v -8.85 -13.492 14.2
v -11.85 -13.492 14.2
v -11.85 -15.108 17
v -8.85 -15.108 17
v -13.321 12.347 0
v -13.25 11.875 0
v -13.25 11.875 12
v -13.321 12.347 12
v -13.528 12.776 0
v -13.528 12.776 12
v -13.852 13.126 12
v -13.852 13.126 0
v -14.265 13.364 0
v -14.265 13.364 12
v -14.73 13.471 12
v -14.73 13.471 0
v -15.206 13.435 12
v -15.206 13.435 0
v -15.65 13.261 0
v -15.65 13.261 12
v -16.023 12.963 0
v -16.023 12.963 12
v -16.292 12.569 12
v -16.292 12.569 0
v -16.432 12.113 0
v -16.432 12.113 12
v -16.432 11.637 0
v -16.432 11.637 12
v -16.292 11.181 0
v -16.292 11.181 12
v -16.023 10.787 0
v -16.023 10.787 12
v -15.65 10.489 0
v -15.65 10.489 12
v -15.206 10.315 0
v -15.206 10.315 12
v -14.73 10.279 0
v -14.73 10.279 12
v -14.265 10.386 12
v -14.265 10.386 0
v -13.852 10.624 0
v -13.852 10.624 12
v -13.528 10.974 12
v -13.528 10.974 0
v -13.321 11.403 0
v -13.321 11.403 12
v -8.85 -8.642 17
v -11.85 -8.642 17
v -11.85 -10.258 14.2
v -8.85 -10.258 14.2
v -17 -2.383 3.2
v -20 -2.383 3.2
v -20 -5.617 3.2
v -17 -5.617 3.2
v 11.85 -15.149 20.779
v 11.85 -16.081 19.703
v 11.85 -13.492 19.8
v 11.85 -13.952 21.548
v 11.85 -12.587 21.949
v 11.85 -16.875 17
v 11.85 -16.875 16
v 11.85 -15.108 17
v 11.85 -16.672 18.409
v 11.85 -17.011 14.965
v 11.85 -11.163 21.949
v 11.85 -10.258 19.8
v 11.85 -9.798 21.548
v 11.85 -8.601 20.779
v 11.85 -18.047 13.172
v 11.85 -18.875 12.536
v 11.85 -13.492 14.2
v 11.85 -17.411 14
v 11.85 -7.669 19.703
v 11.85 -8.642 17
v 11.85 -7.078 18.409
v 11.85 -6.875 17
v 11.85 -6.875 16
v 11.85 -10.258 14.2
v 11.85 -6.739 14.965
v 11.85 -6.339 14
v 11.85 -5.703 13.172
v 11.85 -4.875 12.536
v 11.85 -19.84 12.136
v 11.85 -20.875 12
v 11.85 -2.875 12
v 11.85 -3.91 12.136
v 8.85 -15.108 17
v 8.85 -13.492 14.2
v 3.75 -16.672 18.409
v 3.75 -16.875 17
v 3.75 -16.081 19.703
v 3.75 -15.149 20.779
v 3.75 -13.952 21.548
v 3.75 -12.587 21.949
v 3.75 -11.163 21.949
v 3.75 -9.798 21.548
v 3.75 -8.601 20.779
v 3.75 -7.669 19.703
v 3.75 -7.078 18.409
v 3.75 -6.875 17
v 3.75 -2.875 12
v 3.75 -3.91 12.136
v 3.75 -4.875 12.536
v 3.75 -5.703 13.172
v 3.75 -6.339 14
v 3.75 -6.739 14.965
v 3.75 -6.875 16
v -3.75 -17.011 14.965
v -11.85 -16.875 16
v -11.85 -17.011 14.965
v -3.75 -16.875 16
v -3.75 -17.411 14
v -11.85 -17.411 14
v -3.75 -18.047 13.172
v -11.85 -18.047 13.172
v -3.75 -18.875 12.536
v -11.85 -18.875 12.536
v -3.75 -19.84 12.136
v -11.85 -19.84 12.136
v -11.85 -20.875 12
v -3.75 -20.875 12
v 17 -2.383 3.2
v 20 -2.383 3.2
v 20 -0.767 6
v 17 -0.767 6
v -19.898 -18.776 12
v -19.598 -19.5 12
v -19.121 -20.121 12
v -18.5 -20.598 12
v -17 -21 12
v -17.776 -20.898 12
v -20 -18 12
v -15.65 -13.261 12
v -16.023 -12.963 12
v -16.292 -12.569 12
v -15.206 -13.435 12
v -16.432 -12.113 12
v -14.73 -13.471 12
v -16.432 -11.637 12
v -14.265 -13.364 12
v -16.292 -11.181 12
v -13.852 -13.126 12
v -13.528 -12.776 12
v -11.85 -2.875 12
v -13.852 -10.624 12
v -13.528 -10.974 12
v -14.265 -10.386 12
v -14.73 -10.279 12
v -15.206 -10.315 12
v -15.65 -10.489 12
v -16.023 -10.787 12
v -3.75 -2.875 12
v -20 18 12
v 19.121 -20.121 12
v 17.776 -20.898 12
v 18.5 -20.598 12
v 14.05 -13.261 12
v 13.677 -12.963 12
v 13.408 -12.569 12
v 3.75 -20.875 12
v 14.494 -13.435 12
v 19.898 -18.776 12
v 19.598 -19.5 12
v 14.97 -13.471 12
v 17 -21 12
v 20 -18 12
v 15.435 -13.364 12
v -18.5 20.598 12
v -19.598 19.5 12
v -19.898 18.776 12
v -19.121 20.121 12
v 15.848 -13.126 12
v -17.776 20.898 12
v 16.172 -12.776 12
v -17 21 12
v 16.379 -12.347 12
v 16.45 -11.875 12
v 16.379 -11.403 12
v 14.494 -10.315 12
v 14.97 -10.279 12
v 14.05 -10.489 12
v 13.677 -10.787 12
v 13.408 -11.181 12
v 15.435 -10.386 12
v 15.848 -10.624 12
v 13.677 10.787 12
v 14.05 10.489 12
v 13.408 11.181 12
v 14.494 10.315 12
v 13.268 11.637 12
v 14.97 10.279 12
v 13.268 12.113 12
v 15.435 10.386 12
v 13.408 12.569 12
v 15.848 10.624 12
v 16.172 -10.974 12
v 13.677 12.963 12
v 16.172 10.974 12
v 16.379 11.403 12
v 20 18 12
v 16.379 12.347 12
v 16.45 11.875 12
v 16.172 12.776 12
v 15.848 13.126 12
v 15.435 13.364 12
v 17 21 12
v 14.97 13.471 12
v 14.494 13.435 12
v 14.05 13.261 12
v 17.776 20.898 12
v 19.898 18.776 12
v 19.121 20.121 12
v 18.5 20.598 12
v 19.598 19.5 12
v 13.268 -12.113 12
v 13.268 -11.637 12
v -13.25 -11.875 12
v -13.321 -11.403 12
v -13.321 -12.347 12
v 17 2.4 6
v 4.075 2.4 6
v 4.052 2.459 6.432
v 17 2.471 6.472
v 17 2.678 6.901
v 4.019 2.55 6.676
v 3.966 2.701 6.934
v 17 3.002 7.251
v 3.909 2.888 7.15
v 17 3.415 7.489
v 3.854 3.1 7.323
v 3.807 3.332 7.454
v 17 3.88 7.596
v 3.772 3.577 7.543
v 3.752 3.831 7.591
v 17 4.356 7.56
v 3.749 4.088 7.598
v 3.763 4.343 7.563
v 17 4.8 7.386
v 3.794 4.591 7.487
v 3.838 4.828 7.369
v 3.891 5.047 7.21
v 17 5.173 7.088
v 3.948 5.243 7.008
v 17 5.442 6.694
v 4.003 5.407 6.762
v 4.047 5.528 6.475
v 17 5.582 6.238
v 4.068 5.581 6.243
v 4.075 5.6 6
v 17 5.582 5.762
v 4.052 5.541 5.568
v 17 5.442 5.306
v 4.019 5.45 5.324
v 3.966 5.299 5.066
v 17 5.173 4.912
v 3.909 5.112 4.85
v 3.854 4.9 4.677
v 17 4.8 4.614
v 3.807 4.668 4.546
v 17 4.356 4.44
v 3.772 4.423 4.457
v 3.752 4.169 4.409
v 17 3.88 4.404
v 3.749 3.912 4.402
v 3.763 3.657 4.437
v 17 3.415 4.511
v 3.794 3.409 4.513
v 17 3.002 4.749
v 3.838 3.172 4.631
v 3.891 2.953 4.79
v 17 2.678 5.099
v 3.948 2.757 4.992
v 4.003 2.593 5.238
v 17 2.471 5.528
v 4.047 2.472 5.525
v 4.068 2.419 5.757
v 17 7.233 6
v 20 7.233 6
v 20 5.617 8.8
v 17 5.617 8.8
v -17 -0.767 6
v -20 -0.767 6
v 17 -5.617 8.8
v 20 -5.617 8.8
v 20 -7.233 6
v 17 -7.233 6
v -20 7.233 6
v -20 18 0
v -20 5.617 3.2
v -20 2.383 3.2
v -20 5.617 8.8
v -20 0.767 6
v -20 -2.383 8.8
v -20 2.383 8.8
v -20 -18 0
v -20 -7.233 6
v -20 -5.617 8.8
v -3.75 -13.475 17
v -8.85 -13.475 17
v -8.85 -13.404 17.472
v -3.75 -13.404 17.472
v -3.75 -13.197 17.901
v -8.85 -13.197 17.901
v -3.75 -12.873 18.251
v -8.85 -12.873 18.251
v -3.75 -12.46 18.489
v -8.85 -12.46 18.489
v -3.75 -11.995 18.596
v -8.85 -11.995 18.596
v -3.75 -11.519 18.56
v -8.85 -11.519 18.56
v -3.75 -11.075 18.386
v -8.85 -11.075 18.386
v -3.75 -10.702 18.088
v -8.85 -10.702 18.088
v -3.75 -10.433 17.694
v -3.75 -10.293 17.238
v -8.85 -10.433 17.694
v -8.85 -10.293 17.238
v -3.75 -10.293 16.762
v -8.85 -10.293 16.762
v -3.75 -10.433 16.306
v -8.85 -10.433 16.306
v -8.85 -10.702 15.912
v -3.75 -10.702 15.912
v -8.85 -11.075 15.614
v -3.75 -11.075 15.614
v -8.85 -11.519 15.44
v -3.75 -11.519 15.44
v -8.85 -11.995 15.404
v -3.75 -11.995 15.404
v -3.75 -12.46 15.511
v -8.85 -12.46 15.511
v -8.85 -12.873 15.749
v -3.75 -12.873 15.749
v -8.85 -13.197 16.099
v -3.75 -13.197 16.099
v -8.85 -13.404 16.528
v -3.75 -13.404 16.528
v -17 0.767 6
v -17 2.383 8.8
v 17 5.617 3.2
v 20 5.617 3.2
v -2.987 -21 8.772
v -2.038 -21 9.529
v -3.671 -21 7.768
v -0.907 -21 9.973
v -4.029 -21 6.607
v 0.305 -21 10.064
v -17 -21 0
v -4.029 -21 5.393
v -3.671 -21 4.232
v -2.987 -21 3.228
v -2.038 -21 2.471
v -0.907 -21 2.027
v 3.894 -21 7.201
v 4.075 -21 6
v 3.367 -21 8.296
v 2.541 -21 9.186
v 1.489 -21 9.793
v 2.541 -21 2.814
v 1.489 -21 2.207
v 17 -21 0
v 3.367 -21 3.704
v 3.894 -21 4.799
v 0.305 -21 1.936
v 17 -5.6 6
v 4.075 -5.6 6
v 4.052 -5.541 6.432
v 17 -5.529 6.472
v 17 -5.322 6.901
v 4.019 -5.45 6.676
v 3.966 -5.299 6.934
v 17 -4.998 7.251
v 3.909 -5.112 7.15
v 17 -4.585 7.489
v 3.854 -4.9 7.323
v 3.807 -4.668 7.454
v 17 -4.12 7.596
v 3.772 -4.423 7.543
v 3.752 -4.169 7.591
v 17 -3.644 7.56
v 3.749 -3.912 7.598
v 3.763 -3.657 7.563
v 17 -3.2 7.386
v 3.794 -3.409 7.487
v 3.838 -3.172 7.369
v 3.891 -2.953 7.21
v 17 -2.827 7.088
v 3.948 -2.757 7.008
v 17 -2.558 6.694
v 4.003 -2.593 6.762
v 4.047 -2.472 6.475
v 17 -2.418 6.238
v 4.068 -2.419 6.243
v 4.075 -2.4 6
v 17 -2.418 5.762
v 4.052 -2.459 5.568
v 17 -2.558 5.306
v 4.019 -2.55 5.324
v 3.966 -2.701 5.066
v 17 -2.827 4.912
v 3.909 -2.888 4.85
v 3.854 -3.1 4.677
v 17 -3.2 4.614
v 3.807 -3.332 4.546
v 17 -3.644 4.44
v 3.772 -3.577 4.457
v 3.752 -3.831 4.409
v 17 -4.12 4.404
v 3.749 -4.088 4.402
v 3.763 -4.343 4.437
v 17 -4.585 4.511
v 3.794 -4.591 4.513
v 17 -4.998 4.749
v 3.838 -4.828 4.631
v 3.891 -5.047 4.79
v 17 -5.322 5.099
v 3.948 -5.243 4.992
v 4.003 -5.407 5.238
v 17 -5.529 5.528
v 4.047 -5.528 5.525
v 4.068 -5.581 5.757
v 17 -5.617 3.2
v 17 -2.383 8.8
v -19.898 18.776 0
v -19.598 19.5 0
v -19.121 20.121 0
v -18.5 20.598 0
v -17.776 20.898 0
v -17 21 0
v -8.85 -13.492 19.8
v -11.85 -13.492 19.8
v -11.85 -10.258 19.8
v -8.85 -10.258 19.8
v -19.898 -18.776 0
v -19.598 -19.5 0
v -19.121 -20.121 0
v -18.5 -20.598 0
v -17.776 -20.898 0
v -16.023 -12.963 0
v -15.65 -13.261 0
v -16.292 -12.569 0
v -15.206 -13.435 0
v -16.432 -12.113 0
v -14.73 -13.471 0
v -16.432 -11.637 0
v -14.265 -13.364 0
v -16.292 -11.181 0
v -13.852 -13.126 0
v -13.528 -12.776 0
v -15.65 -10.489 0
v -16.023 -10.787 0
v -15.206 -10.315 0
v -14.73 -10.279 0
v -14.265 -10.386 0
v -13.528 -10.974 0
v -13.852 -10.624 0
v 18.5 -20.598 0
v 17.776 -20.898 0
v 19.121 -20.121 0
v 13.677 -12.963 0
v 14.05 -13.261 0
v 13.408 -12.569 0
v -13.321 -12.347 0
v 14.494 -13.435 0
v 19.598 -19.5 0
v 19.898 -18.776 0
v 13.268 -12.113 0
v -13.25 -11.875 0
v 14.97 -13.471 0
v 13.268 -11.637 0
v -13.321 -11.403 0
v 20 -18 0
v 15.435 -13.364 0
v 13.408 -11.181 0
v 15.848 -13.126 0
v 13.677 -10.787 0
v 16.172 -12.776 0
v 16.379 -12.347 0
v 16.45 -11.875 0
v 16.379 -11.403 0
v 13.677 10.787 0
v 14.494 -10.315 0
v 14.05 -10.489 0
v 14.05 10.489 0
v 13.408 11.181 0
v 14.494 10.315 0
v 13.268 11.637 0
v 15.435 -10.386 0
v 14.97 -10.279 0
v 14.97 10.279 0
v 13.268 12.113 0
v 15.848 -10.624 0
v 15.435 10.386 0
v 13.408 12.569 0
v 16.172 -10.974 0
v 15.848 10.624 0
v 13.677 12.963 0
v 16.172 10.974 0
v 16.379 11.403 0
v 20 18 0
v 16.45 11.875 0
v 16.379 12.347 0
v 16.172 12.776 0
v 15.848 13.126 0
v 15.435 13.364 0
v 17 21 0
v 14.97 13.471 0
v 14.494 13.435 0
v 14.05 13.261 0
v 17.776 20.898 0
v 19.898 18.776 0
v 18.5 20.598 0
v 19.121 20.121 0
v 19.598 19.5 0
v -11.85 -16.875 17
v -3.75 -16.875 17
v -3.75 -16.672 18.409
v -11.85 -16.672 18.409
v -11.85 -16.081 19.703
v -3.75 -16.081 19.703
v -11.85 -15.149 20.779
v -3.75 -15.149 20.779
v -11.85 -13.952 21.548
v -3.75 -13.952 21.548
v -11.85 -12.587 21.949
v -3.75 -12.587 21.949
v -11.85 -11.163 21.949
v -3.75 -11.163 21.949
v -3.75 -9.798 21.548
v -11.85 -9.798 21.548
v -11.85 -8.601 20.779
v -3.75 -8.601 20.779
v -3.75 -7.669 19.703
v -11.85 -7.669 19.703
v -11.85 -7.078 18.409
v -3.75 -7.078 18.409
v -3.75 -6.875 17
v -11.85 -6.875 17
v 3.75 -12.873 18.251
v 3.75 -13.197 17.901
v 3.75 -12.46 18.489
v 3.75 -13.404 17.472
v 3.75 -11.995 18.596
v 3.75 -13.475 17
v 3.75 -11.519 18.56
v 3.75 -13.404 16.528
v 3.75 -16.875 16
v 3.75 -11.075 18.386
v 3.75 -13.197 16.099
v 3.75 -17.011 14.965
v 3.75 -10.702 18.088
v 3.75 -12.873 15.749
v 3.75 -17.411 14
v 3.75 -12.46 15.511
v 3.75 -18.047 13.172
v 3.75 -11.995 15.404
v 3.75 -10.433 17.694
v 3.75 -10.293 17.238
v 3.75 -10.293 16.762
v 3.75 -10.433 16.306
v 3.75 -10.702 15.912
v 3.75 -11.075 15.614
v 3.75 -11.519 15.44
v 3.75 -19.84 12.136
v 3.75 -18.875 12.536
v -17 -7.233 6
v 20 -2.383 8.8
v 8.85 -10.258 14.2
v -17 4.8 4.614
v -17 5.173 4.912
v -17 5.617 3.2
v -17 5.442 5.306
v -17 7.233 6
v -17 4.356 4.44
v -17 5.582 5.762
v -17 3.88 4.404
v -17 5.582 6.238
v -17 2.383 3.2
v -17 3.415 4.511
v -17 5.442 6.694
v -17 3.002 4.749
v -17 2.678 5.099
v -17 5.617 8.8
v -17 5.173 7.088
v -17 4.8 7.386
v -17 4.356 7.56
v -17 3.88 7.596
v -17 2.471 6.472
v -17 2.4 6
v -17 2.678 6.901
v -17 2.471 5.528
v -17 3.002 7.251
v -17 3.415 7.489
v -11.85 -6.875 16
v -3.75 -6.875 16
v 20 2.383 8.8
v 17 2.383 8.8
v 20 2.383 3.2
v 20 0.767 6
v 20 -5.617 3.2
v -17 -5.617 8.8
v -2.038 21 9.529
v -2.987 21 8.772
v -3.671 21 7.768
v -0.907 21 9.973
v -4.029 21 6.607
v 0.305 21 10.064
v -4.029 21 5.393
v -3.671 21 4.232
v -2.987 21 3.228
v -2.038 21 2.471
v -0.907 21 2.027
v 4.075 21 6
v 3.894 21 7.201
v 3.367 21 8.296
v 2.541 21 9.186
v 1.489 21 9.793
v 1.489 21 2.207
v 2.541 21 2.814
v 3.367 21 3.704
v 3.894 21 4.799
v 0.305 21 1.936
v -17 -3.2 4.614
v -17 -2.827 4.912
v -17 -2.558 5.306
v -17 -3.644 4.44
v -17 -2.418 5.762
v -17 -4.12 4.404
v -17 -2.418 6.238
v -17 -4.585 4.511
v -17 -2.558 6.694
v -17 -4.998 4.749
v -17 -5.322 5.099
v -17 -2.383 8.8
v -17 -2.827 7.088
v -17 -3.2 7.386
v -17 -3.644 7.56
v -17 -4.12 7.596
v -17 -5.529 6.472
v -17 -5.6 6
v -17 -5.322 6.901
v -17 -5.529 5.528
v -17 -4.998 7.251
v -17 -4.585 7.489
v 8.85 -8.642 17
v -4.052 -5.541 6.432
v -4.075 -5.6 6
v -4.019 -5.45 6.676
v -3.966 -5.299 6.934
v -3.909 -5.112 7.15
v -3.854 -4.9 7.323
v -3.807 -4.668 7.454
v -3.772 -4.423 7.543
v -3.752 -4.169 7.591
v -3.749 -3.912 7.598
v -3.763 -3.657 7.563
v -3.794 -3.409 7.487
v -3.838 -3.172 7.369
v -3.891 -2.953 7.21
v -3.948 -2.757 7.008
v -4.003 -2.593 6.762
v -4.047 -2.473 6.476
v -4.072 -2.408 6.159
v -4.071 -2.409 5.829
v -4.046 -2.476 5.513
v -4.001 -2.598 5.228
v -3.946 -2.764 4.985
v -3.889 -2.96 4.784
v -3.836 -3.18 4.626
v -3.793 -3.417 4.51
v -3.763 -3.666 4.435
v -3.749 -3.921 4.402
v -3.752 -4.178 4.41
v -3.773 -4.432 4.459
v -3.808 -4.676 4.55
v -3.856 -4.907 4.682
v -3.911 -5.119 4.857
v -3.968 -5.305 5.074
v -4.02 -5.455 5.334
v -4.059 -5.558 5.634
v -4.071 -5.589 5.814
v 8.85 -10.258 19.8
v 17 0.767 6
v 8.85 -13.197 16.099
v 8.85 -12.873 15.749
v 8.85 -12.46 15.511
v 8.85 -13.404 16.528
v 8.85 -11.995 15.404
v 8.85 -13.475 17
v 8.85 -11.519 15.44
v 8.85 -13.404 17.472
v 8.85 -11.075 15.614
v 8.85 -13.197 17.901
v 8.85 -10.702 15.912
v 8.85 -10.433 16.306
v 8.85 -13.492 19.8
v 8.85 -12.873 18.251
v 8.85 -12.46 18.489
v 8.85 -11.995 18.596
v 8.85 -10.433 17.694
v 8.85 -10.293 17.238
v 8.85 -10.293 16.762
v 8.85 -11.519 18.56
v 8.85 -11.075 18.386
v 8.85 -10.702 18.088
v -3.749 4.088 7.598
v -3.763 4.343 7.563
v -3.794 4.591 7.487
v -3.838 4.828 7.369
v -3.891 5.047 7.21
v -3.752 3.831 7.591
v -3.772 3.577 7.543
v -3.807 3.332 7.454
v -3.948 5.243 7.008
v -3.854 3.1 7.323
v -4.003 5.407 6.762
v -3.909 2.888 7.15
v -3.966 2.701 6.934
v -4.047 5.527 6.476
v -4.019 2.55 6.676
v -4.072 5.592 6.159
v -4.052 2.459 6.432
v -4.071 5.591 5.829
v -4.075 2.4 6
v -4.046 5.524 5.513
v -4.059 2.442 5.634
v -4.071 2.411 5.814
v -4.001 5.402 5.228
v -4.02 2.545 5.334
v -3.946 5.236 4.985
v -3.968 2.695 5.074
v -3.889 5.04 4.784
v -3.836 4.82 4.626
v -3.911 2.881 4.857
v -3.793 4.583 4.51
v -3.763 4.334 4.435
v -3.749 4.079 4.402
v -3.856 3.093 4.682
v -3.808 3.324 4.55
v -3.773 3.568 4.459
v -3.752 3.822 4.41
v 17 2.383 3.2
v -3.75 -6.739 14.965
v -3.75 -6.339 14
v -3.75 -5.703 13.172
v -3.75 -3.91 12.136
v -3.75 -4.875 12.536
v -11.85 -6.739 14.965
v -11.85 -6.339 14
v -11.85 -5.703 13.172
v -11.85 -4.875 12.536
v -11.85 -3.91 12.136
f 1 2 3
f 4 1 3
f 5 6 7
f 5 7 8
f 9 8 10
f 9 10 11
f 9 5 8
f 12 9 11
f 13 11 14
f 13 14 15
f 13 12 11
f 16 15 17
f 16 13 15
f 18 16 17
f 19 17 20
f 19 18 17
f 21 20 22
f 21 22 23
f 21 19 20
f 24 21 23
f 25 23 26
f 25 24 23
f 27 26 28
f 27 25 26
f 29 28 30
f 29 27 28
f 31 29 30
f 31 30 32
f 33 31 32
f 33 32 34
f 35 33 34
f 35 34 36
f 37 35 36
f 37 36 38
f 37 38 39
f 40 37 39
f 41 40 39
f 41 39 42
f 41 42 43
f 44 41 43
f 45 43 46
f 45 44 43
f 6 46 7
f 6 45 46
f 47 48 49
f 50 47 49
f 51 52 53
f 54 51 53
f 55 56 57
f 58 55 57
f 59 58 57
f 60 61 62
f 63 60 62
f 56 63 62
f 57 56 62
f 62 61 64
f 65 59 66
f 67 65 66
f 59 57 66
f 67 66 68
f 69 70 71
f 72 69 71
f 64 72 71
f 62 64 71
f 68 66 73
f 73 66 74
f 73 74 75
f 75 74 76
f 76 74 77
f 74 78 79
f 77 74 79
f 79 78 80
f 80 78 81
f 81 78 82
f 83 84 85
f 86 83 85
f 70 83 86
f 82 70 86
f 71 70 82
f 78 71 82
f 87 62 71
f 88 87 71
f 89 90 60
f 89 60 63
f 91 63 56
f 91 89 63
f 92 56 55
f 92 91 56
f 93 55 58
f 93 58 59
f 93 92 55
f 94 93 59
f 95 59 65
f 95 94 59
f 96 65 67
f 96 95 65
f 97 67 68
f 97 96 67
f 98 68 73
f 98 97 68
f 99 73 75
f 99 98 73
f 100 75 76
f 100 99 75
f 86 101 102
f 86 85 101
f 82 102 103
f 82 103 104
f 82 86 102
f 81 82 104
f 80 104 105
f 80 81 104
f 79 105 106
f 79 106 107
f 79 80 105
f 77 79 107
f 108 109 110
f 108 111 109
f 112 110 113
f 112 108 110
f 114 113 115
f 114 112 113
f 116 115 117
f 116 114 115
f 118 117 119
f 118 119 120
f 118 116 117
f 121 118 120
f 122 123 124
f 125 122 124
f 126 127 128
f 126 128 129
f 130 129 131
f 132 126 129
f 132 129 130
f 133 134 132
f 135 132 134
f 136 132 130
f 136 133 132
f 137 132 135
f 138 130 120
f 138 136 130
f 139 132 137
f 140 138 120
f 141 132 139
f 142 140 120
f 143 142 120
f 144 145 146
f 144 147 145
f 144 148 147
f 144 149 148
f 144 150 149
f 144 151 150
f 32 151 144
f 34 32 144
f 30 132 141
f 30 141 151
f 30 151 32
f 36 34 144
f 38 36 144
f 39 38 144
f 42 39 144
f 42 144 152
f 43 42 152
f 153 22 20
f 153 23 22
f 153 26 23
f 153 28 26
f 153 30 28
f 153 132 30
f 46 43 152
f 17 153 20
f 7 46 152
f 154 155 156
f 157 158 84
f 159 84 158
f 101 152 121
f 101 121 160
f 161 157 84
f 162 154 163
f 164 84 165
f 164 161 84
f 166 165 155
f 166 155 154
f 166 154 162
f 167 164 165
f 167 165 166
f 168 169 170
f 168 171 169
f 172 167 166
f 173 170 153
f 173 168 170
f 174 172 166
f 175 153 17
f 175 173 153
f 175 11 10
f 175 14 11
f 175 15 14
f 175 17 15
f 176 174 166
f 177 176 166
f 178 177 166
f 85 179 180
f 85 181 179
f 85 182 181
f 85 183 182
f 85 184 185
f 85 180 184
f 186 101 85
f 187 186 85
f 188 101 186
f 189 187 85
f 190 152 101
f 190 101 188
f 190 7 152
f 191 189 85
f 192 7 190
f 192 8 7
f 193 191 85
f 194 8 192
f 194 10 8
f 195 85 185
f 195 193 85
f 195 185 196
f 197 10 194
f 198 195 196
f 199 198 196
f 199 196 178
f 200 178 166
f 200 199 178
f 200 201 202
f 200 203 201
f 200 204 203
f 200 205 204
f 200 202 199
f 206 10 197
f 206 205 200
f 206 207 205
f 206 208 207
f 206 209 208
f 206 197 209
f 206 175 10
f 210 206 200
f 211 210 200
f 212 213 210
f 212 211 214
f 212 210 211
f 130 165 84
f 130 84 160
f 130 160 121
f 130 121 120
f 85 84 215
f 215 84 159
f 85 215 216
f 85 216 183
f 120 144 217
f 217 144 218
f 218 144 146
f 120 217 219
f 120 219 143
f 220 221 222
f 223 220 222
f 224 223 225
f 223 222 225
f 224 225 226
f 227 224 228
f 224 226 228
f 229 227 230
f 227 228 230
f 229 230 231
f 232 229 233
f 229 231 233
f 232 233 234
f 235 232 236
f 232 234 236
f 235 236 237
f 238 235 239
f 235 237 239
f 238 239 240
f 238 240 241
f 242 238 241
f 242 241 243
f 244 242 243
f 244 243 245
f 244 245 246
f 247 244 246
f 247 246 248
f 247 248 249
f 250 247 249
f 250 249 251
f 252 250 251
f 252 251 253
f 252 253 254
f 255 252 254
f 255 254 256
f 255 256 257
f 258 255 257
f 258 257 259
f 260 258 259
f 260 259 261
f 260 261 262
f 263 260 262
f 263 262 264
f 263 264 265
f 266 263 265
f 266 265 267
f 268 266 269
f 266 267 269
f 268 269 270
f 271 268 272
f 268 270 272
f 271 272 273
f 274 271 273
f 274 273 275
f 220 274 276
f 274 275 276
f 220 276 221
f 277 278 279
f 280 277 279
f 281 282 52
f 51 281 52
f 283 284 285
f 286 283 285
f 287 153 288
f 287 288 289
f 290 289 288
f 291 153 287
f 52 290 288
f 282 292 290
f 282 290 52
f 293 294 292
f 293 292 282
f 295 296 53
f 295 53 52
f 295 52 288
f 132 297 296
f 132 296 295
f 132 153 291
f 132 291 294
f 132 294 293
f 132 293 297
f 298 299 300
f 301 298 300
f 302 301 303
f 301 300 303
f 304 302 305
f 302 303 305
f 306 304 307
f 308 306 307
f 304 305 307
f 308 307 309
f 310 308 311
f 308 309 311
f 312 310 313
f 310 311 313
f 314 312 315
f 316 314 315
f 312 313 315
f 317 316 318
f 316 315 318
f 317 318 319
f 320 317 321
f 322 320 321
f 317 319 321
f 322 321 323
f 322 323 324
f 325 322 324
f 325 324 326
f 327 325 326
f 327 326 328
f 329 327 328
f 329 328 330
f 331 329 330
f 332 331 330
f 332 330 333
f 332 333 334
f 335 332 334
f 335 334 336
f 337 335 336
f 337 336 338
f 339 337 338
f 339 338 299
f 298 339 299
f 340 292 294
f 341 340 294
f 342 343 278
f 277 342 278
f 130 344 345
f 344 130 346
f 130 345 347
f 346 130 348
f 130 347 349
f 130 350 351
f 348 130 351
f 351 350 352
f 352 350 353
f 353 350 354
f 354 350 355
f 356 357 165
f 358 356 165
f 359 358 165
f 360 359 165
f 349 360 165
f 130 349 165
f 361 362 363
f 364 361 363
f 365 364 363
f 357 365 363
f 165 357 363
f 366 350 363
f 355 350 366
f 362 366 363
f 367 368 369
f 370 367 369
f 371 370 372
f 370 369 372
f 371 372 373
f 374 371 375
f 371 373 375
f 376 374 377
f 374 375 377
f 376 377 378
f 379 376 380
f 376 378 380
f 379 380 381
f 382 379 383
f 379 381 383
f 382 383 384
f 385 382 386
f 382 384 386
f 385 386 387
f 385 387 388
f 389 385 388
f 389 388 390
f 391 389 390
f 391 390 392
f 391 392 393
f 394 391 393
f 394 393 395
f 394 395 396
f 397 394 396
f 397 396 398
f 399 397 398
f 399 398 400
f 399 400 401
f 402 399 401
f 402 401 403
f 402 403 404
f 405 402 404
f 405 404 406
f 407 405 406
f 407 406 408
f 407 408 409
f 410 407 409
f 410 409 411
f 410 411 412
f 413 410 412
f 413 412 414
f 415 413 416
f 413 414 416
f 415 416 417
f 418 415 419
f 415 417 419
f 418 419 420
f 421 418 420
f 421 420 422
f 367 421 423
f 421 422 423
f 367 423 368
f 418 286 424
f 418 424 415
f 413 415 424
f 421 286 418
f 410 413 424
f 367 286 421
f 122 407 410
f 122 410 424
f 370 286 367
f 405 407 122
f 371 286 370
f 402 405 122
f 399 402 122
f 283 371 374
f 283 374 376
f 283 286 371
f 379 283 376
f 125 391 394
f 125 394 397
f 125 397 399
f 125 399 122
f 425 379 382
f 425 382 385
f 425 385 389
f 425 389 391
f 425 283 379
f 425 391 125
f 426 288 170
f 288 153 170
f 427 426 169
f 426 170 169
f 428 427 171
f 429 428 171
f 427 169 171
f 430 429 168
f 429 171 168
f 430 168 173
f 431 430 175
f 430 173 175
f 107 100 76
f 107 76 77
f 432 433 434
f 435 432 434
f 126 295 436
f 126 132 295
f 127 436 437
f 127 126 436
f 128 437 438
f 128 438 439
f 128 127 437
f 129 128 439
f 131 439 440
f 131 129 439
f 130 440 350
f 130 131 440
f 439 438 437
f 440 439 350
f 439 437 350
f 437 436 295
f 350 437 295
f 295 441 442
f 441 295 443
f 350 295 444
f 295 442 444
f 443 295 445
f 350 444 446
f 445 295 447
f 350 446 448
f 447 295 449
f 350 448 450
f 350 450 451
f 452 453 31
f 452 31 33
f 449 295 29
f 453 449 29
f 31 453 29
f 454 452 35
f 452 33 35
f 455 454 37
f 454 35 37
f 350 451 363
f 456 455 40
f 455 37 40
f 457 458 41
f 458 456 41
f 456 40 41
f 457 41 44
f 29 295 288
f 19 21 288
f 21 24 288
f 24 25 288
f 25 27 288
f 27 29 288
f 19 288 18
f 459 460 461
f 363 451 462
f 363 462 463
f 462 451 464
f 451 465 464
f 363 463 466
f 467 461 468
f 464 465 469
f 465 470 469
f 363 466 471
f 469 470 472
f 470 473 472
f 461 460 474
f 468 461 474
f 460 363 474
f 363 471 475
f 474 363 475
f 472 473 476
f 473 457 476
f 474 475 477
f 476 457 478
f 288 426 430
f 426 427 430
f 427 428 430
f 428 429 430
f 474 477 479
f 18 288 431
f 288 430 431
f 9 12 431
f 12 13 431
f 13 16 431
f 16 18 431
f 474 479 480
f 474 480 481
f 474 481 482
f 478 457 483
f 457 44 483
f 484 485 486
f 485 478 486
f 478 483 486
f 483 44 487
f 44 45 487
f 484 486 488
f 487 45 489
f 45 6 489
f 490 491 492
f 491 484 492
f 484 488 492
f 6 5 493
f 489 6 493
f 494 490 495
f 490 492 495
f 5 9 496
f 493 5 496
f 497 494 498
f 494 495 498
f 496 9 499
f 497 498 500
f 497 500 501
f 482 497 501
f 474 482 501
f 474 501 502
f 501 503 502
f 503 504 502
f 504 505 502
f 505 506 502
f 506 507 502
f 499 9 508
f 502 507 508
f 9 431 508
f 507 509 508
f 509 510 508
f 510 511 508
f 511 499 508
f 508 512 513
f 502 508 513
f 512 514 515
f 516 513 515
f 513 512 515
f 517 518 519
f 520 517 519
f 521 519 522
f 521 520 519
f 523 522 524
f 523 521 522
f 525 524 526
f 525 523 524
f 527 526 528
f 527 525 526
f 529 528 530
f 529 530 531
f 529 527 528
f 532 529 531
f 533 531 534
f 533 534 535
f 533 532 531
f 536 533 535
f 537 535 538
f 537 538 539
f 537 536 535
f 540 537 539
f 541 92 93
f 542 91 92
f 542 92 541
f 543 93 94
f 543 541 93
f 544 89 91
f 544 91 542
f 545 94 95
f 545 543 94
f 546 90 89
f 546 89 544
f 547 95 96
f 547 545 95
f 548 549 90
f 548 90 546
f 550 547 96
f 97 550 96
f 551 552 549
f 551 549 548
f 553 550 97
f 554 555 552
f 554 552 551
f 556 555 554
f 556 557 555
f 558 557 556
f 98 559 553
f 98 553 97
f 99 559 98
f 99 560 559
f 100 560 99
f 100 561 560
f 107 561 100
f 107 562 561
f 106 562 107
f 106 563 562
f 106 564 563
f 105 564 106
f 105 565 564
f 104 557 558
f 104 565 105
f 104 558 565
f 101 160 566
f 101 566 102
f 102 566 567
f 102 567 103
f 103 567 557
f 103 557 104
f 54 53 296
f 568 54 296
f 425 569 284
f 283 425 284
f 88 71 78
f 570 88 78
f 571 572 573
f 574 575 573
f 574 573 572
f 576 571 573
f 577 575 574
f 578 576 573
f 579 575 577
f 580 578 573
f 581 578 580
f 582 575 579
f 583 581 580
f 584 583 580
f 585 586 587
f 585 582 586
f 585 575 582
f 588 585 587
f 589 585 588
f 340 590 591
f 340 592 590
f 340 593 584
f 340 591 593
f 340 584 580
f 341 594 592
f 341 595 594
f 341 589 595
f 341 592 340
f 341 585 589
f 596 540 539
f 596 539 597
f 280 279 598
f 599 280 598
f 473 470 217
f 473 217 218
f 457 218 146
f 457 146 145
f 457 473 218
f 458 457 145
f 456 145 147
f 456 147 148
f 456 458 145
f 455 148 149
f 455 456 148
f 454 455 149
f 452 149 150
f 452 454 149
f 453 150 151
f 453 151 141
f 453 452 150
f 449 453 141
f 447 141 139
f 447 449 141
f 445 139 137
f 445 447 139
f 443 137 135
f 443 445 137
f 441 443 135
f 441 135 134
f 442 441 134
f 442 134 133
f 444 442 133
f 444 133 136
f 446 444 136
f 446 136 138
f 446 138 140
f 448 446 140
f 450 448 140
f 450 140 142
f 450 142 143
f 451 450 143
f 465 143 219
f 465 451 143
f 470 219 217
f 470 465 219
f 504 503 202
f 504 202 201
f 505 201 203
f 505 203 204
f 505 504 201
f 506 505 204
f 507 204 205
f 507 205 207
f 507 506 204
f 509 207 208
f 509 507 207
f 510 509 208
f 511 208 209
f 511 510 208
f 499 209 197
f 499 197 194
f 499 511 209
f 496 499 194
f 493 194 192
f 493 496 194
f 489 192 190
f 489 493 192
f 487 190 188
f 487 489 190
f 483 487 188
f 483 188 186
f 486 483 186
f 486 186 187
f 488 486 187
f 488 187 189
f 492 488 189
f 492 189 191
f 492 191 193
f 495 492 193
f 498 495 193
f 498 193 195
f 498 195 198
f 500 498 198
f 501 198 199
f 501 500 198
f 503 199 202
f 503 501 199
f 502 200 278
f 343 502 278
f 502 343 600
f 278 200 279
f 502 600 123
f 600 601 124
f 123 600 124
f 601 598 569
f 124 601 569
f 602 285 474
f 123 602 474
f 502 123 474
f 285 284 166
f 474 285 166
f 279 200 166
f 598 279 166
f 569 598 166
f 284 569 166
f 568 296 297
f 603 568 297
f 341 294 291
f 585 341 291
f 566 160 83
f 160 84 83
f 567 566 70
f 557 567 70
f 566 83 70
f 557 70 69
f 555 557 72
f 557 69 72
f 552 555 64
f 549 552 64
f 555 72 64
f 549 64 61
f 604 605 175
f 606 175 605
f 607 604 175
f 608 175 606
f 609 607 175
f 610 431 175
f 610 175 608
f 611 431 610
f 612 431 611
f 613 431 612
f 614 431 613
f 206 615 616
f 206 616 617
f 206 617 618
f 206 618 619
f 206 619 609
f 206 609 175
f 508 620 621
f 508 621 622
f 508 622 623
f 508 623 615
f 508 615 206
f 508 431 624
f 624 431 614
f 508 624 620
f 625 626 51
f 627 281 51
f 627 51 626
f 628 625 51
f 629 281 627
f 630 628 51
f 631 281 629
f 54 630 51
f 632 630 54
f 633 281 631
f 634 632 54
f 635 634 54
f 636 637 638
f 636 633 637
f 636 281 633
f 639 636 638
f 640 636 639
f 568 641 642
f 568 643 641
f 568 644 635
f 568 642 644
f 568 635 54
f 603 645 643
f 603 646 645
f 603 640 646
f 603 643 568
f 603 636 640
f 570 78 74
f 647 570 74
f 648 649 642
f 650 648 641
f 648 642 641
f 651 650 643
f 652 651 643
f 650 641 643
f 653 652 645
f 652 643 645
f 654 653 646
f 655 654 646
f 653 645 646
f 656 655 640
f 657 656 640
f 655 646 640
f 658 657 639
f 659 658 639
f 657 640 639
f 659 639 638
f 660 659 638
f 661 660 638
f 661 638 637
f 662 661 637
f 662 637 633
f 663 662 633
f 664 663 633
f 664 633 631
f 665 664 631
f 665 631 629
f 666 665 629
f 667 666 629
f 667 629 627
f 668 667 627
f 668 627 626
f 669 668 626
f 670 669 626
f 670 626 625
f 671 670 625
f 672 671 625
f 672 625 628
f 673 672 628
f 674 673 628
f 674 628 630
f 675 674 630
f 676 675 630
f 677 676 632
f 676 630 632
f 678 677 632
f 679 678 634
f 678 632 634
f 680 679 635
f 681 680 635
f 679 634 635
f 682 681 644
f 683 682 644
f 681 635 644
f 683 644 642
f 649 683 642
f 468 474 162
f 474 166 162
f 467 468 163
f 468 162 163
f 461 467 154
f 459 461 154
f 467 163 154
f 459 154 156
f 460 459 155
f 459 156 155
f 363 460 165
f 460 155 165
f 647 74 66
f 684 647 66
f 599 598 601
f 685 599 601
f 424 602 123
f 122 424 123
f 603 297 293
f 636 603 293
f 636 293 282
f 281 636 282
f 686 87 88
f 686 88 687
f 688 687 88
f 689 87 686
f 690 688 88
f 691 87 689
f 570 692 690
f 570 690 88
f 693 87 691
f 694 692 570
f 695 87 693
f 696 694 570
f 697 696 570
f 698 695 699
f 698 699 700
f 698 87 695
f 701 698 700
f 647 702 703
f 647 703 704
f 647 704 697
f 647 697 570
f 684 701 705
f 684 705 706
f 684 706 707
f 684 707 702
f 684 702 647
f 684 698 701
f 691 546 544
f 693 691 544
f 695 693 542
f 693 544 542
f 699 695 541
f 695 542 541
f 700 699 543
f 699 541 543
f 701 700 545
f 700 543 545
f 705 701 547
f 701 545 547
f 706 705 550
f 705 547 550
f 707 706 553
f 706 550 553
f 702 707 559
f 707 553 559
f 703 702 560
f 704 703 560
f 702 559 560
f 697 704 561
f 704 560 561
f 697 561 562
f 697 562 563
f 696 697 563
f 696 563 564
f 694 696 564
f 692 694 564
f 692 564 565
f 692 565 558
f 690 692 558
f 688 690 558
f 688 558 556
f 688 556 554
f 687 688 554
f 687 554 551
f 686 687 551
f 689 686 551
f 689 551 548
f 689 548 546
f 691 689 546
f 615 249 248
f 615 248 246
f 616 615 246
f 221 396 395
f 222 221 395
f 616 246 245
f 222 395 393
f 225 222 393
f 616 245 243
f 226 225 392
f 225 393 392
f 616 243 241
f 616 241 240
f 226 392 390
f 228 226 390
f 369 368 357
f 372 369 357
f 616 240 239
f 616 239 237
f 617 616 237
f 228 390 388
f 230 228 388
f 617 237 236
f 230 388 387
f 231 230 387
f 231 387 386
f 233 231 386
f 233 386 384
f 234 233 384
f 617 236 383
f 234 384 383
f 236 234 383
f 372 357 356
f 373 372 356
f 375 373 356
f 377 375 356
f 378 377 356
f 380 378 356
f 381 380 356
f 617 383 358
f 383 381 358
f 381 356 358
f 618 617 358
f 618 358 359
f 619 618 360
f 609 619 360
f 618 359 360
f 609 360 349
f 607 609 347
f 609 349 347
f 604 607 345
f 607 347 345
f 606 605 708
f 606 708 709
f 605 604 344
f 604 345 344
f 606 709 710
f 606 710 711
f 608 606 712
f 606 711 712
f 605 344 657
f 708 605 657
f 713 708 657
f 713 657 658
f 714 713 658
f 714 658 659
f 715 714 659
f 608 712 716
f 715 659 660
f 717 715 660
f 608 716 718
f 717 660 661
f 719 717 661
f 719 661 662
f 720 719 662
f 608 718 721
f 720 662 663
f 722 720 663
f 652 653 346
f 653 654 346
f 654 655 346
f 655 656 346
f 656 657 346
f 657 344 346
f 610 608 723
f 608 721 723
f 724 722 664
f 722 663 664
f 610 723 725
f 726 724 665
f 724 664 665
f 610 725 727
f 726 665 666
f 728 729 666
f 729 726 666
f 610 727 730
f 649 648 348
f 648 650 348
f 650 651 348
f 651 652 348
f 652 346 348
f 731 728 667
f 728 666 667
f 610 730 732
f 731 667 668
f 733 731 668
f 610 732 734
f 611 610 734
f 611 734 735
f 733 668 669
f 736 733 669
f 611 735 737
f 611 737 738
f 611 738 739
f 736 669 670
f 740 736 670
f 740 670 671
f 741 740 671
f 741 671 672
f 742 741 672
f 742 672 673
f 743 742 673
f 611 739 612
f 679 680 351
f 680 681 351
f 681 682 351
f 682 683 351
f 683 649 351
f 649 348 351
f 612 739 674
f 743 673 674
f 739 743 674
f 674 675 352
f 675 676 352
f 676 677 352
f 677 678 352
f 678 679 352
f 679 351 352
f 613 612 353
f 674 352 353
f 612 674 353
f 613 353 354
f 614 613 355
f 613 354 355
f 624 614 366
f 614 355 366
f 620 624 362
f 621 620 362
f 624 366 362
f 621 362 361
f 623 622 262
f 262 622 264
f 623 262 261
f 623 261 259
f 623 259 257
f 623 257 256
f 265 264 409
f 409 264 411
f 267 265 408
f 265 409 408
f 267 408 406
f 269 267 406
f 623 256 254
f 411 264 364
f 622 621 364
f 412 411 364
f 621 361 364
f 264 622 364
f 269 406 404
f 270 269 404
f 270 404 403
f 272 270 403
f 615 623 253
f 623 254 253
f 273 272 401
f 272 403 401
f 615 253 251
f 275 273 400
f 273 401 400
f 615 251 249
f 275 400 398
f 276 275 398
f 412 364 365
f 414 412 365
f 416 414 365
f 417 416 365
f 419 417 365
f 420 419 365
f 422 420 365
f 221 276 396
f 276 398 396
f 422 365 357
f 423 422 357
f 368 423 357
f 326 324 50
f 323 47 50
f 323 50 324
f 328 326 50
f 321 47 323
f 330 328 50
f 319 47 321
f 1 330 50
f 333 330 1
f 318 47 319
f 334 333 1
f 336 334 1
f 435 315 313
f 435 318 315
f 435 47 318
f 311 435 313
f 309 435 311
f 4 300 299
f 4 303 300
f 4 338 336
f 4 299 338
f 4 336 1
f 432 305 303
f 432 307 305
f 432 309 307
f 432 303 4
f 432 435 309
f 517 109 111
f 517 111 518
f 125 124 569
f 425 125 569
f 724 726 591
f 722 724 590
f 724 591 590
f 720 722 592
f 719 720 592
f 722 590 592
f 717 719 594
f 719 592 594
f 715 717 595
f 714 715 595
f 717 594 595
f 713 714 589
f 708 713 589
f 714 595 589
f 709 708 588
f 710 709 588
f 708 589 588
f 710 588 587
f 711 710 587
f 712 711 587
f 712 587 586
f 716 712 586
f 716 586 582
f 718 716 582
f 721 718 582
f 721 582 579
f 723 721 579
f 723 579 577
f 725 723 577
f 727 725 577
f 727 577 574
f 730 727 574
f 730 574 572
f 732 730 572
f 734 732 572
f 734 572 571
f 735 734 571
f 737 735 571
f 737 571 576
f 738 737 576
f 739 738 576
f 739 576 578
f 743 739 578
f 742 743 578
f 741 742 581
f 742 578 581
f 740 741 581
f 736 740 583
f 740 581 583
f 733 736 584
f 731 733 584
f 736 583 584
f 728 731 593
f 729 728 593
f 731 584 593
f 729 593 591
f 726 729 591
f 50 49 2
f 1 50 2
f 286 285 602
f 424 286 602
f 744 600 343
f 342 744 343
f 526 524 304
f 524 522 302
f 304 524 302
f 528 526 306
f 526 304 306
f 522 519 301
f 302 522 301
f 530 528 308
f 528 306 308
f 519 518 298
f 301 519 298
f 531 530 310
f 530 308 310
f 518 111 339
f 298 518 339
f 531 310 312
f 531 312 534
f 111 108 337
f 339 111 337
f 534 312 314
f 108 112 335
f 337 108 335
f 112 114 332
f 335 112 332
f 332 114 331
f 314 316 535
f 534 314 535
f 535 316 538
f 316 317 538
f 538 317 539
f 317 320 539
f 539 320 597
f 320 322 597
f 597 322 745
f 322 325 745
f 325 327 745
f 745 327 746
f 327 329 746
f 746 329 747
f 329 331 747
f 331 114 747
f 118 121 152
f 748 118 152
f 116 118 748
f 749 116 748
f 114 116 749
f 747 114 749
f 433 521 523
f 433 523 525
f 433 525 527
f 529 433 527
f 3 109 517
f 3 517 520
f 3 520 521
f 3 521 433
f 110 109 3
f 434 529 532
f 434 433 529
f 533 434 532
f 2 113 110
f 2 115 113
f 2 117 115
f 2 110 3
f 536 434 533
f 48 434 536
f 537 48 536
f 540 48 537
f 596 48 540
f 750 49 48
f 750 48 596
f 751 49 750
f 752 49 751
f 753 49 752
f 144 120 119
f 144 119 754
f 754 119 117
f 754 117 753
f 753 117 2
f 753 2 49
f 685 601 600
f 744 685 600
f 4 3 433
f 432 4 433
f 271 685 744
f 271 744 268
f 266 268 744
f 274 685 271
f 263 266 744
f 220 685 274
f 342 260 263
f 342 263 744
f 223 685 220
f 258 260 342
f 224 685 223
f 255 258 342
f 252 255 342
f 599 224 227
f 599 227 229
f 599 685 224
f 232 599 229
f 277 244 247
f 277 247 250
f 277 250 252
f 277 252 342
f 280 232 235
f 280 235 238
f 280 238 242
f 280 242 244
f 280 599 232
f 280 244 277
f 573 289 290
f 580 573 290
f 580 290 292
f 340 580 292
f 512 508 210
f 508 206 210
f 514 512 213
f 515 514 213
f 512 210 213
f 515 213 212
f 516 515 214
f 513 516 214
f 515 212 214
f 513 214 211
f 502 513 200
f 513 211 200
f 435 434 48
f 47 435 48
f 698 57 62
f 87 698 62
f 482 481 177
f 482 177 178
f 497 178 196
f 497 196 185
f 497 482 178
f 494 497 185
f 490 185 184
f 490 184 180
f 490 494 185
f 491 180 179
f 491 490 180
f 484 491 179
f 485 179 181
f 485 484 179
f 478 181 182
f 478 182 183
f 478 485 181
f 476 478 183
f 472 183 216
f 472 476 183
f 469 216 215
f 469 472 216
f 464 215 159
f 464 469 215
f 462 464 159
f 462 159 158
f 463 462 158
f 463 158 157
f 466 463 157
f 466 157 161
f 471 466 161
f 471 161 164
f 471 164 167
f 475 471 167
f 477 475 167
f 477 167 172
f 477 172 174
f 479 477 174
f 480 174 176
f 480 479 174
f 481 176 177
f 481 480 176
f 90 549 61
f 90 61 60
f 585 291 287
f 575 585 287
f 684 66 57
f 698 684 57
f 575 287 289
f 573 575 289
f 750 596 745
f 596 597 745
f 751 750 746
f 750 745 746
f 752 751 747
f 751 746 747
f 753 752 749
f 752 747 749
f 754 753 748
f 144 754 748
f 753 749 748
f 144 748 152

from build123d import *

# Parameters (mm, degrees)
SKETCH_W        = 40
SKETCH_H        = 42
SKETCH_R        = 1.6
PAD_DEPTH       = 12
SKETCH001_R     = 4.075
POCKET_DEPTH    = 42.001
SKETCH003_R     = 1.6
PAD001_DEPTH    = 40
SKETCH004_W     = 8.15
SKETCH004_H     = 42
SKETCH004_R     = 3
SKETCH004_W_2   = 7.5
POCKET001_DEPTH = 10.001
POCKET002_DEPTH = 3
POCKET003_DEPTH = 3
FILLET_R        = 4
FILLET001_R     = 3
SKETCH008_R     = 1.6
POCKET004_DEPTH = 40.001
POCKET005_DEPTH = 3
POCKET006_DEPTH = 3
POCKET007_DEPTH = 40.001


with BuildPart() as part:
    # Sketch → Pad (new body)
    with BuildSketch(Plane.XY):
        Rectangle(SKETCH_W, SKETCH_H)
        with Locations((-14.85, 11.875)):
            Circle(SKETCH_R, mode=Mode.SUBTRACT)
        with Locations((14.85, 11.875)):
            Circle(SKETCH_R, mode=Mode.SUBTRACT)
        with Locations((-14.85, -11.875)):
            Circle(SKETCH_R, mode=Mode.SUBTRACT)
        with Locations((14.85, -11.875)):
            Circle(SKETCH_R, mode=Mode.SUBTRACT)
    extrude(amount=PAD_DEPTH)

    # Sketch001 (on Face3 of Pad) → Pocket (cut, through all)
    with BuildSketch(Plane.XZ.offset(21)):
        with Locations((0, 6)):
            Circle(SKETCH001_R)
    extrude(amount=-POCKET_DEPTH, mode=Mode.SUBTRACT)

    # Sketch003 (on Face2 of Pocket) → Pad001 (join)
    with BuildSketch(Plane(origin=(-20, 0, 0), x_dir=(0, -1, 0), z_dir=(-1, 0, 0))):
        with BuildLine():
            ThreePointArc((16.875, 17), (11.875, 22), (6.875, 17))
            Line((6.875, 17), (6.875, 12))
            Line((16.875, 12), (6.875, 12))
            Line((16.875, 12), (16.875, 17))
        make_face()
        with Locations((11.875, 17)):
            Circle(SKETCH003_R, mode=Mode.SUBTRACT)
    extrude(amount=-PAD001_DEPTH)

    # Sketch004 (on Face4 of Pad001) → Pocket001 (cut, through all)
    with BuildSketch(Plane.XY.offset(12)):
        with Locations((-15.925, 0)):
            Rectangle(SKETCH004_W, SKETCH004_H)
        with Locations((-14.85, 11.875)):
            Circle(SKETCH004_R, mode=Mode.SUBTRACT)
        with Locations((15.925, 0)):
            Rectangle(SKETCH004_W, SKETCH004_H)
        Rectangle(SKETCH004_W_2, SKETCH004_H)
    extrude(amount=POCKET001_DEPTH, mode=Mode.SUBTRACT)

    # Sketch005 (on Face31 of Pocket001) → Pocket002 (cut)
    with BuildSketch(Plane.YZ.offset(11.85)):
        Polygon((-10.258419, 19.8), (-13.491581, 19.8), (-15.108162, 17), (-13.491581, 14.2), (-10.258419, 14.2), (-8.641838, 17), align=None)
    extrude(amount=-POCKET002_DEPTH, mode=Mode.SUBTRACT)

    # Sketch006 (on Face27 of Pocket002) → Pocket003 (cut)
    with BuildSketch(Plane(origin=(-11.85, 0, 0), x_dir=(0, -1, 0), z_dir=(-1, 0, 0))):
        Polygon((13.491581, 19.8), (10.258419, 19.8), (8.641838, 17), (10.258419, 14.2), (13.491581, 14.2), (15.108162, 17), align=None)
    extrude(amount=-POCKET003_DEPTH, mode=Mode.SUBTRACT)

    # Fillet
    fillet_edges = [part.edges().sort_by_distance(p)[0] for p in [
        (7.8, -16.875, 12),
        (-7.8, -16.875, 12),
        (7.8, -6.875, 12),
        (-7.8, -6.875, 12),
    ]]
    fillet(fillet_edges, radius=FILLET_R)

    # Fillet001
    fillet001_edges = [part.edges().sort_by_distance(p)[0] for p in [
        (20, -21, 6),
        (-20, -21, 6),
        (20, 21, 6),
        (-20, 21, 6),
    ]]
    fillet(fillet001_edges, radius=FILLET001_R)

    # Sketch008 (on Face5 of Fillet001) → Pocket004 (cut, through all)
    with BuildSketch(Plane(origin=(-20, 0, 0), x_dir=(0, -1, 0), z_dir=(-1, 0, 0))):
        with Locations((-4, 6)):
            Circle(SKETCH008_R)
        with Locations((4, 6)):
            Circle(SKETCH008_R)
    extrude(amount=-POCKET004_DEPTH, mode=Mode.SUBTRACT)

    # Sketch009 (on Face5 of Pocket004) → Pocket005 (cut)
    with BuildSketch(Plane(origin=(-20, 0, 0), x_dir=(0, -1, 0), z_dir=(-1, 0, 0))):
        Polygon((-2.383419, 8.8), (-5.616581, 8.8), (-7.233162, 6), (-5.616581, 3.2), (-2.383419, 3.2), (-0.766838, 6), align=None)
        Polygon((5.616581, 8.8), (2.383419, 8.8), (0.766838, 6), (2.383419, 3.2), (5.616581, 3.2), (7.233162, 6), align=None)
    extrude(amount=-POCKET005_DEPTH, mode=Mode.SUBTRACT)

    # Sketch010 (on Face42 of Pocket005) → Pocket006 (cut)
    with BuildSketch(Plane.YZ.offset(20)):
        Polygon((-2.383419, 8.8), (-5.616581, 8.8), (-7.233162, 6), (-5.616581, 3.2), (-2.383419, 3.2), (-0.766838, 6), align=None)
        Polygon((5.616581, 8.8), (2.383419, 8.8), (0.766838, 6), (2.383419, 3.2), (5.616581, 3.2), (7.233162, 6), align=None)
    extrude(amount=-POCKET006_DEPTH, mode=Mode.SUBTRACT)

    # Sketch008 (on Face5 of Fillet001) → Pocket007 (cut, through all)
    with BuildSketch(Plane(origin=(-20, 0, 0), x_dir=(0, -1, 0), z_dir=(-1, 0, 0))):
        with Locations((-4, 6)):
            Circle(SKETCH008_R)
        with Locations((4, 6)):
            Circle(SKETCH008_R)
    extrude(amount=-POCKET007_DEPTH, mode=Mode.SUBTRACT)


solid = part.part
